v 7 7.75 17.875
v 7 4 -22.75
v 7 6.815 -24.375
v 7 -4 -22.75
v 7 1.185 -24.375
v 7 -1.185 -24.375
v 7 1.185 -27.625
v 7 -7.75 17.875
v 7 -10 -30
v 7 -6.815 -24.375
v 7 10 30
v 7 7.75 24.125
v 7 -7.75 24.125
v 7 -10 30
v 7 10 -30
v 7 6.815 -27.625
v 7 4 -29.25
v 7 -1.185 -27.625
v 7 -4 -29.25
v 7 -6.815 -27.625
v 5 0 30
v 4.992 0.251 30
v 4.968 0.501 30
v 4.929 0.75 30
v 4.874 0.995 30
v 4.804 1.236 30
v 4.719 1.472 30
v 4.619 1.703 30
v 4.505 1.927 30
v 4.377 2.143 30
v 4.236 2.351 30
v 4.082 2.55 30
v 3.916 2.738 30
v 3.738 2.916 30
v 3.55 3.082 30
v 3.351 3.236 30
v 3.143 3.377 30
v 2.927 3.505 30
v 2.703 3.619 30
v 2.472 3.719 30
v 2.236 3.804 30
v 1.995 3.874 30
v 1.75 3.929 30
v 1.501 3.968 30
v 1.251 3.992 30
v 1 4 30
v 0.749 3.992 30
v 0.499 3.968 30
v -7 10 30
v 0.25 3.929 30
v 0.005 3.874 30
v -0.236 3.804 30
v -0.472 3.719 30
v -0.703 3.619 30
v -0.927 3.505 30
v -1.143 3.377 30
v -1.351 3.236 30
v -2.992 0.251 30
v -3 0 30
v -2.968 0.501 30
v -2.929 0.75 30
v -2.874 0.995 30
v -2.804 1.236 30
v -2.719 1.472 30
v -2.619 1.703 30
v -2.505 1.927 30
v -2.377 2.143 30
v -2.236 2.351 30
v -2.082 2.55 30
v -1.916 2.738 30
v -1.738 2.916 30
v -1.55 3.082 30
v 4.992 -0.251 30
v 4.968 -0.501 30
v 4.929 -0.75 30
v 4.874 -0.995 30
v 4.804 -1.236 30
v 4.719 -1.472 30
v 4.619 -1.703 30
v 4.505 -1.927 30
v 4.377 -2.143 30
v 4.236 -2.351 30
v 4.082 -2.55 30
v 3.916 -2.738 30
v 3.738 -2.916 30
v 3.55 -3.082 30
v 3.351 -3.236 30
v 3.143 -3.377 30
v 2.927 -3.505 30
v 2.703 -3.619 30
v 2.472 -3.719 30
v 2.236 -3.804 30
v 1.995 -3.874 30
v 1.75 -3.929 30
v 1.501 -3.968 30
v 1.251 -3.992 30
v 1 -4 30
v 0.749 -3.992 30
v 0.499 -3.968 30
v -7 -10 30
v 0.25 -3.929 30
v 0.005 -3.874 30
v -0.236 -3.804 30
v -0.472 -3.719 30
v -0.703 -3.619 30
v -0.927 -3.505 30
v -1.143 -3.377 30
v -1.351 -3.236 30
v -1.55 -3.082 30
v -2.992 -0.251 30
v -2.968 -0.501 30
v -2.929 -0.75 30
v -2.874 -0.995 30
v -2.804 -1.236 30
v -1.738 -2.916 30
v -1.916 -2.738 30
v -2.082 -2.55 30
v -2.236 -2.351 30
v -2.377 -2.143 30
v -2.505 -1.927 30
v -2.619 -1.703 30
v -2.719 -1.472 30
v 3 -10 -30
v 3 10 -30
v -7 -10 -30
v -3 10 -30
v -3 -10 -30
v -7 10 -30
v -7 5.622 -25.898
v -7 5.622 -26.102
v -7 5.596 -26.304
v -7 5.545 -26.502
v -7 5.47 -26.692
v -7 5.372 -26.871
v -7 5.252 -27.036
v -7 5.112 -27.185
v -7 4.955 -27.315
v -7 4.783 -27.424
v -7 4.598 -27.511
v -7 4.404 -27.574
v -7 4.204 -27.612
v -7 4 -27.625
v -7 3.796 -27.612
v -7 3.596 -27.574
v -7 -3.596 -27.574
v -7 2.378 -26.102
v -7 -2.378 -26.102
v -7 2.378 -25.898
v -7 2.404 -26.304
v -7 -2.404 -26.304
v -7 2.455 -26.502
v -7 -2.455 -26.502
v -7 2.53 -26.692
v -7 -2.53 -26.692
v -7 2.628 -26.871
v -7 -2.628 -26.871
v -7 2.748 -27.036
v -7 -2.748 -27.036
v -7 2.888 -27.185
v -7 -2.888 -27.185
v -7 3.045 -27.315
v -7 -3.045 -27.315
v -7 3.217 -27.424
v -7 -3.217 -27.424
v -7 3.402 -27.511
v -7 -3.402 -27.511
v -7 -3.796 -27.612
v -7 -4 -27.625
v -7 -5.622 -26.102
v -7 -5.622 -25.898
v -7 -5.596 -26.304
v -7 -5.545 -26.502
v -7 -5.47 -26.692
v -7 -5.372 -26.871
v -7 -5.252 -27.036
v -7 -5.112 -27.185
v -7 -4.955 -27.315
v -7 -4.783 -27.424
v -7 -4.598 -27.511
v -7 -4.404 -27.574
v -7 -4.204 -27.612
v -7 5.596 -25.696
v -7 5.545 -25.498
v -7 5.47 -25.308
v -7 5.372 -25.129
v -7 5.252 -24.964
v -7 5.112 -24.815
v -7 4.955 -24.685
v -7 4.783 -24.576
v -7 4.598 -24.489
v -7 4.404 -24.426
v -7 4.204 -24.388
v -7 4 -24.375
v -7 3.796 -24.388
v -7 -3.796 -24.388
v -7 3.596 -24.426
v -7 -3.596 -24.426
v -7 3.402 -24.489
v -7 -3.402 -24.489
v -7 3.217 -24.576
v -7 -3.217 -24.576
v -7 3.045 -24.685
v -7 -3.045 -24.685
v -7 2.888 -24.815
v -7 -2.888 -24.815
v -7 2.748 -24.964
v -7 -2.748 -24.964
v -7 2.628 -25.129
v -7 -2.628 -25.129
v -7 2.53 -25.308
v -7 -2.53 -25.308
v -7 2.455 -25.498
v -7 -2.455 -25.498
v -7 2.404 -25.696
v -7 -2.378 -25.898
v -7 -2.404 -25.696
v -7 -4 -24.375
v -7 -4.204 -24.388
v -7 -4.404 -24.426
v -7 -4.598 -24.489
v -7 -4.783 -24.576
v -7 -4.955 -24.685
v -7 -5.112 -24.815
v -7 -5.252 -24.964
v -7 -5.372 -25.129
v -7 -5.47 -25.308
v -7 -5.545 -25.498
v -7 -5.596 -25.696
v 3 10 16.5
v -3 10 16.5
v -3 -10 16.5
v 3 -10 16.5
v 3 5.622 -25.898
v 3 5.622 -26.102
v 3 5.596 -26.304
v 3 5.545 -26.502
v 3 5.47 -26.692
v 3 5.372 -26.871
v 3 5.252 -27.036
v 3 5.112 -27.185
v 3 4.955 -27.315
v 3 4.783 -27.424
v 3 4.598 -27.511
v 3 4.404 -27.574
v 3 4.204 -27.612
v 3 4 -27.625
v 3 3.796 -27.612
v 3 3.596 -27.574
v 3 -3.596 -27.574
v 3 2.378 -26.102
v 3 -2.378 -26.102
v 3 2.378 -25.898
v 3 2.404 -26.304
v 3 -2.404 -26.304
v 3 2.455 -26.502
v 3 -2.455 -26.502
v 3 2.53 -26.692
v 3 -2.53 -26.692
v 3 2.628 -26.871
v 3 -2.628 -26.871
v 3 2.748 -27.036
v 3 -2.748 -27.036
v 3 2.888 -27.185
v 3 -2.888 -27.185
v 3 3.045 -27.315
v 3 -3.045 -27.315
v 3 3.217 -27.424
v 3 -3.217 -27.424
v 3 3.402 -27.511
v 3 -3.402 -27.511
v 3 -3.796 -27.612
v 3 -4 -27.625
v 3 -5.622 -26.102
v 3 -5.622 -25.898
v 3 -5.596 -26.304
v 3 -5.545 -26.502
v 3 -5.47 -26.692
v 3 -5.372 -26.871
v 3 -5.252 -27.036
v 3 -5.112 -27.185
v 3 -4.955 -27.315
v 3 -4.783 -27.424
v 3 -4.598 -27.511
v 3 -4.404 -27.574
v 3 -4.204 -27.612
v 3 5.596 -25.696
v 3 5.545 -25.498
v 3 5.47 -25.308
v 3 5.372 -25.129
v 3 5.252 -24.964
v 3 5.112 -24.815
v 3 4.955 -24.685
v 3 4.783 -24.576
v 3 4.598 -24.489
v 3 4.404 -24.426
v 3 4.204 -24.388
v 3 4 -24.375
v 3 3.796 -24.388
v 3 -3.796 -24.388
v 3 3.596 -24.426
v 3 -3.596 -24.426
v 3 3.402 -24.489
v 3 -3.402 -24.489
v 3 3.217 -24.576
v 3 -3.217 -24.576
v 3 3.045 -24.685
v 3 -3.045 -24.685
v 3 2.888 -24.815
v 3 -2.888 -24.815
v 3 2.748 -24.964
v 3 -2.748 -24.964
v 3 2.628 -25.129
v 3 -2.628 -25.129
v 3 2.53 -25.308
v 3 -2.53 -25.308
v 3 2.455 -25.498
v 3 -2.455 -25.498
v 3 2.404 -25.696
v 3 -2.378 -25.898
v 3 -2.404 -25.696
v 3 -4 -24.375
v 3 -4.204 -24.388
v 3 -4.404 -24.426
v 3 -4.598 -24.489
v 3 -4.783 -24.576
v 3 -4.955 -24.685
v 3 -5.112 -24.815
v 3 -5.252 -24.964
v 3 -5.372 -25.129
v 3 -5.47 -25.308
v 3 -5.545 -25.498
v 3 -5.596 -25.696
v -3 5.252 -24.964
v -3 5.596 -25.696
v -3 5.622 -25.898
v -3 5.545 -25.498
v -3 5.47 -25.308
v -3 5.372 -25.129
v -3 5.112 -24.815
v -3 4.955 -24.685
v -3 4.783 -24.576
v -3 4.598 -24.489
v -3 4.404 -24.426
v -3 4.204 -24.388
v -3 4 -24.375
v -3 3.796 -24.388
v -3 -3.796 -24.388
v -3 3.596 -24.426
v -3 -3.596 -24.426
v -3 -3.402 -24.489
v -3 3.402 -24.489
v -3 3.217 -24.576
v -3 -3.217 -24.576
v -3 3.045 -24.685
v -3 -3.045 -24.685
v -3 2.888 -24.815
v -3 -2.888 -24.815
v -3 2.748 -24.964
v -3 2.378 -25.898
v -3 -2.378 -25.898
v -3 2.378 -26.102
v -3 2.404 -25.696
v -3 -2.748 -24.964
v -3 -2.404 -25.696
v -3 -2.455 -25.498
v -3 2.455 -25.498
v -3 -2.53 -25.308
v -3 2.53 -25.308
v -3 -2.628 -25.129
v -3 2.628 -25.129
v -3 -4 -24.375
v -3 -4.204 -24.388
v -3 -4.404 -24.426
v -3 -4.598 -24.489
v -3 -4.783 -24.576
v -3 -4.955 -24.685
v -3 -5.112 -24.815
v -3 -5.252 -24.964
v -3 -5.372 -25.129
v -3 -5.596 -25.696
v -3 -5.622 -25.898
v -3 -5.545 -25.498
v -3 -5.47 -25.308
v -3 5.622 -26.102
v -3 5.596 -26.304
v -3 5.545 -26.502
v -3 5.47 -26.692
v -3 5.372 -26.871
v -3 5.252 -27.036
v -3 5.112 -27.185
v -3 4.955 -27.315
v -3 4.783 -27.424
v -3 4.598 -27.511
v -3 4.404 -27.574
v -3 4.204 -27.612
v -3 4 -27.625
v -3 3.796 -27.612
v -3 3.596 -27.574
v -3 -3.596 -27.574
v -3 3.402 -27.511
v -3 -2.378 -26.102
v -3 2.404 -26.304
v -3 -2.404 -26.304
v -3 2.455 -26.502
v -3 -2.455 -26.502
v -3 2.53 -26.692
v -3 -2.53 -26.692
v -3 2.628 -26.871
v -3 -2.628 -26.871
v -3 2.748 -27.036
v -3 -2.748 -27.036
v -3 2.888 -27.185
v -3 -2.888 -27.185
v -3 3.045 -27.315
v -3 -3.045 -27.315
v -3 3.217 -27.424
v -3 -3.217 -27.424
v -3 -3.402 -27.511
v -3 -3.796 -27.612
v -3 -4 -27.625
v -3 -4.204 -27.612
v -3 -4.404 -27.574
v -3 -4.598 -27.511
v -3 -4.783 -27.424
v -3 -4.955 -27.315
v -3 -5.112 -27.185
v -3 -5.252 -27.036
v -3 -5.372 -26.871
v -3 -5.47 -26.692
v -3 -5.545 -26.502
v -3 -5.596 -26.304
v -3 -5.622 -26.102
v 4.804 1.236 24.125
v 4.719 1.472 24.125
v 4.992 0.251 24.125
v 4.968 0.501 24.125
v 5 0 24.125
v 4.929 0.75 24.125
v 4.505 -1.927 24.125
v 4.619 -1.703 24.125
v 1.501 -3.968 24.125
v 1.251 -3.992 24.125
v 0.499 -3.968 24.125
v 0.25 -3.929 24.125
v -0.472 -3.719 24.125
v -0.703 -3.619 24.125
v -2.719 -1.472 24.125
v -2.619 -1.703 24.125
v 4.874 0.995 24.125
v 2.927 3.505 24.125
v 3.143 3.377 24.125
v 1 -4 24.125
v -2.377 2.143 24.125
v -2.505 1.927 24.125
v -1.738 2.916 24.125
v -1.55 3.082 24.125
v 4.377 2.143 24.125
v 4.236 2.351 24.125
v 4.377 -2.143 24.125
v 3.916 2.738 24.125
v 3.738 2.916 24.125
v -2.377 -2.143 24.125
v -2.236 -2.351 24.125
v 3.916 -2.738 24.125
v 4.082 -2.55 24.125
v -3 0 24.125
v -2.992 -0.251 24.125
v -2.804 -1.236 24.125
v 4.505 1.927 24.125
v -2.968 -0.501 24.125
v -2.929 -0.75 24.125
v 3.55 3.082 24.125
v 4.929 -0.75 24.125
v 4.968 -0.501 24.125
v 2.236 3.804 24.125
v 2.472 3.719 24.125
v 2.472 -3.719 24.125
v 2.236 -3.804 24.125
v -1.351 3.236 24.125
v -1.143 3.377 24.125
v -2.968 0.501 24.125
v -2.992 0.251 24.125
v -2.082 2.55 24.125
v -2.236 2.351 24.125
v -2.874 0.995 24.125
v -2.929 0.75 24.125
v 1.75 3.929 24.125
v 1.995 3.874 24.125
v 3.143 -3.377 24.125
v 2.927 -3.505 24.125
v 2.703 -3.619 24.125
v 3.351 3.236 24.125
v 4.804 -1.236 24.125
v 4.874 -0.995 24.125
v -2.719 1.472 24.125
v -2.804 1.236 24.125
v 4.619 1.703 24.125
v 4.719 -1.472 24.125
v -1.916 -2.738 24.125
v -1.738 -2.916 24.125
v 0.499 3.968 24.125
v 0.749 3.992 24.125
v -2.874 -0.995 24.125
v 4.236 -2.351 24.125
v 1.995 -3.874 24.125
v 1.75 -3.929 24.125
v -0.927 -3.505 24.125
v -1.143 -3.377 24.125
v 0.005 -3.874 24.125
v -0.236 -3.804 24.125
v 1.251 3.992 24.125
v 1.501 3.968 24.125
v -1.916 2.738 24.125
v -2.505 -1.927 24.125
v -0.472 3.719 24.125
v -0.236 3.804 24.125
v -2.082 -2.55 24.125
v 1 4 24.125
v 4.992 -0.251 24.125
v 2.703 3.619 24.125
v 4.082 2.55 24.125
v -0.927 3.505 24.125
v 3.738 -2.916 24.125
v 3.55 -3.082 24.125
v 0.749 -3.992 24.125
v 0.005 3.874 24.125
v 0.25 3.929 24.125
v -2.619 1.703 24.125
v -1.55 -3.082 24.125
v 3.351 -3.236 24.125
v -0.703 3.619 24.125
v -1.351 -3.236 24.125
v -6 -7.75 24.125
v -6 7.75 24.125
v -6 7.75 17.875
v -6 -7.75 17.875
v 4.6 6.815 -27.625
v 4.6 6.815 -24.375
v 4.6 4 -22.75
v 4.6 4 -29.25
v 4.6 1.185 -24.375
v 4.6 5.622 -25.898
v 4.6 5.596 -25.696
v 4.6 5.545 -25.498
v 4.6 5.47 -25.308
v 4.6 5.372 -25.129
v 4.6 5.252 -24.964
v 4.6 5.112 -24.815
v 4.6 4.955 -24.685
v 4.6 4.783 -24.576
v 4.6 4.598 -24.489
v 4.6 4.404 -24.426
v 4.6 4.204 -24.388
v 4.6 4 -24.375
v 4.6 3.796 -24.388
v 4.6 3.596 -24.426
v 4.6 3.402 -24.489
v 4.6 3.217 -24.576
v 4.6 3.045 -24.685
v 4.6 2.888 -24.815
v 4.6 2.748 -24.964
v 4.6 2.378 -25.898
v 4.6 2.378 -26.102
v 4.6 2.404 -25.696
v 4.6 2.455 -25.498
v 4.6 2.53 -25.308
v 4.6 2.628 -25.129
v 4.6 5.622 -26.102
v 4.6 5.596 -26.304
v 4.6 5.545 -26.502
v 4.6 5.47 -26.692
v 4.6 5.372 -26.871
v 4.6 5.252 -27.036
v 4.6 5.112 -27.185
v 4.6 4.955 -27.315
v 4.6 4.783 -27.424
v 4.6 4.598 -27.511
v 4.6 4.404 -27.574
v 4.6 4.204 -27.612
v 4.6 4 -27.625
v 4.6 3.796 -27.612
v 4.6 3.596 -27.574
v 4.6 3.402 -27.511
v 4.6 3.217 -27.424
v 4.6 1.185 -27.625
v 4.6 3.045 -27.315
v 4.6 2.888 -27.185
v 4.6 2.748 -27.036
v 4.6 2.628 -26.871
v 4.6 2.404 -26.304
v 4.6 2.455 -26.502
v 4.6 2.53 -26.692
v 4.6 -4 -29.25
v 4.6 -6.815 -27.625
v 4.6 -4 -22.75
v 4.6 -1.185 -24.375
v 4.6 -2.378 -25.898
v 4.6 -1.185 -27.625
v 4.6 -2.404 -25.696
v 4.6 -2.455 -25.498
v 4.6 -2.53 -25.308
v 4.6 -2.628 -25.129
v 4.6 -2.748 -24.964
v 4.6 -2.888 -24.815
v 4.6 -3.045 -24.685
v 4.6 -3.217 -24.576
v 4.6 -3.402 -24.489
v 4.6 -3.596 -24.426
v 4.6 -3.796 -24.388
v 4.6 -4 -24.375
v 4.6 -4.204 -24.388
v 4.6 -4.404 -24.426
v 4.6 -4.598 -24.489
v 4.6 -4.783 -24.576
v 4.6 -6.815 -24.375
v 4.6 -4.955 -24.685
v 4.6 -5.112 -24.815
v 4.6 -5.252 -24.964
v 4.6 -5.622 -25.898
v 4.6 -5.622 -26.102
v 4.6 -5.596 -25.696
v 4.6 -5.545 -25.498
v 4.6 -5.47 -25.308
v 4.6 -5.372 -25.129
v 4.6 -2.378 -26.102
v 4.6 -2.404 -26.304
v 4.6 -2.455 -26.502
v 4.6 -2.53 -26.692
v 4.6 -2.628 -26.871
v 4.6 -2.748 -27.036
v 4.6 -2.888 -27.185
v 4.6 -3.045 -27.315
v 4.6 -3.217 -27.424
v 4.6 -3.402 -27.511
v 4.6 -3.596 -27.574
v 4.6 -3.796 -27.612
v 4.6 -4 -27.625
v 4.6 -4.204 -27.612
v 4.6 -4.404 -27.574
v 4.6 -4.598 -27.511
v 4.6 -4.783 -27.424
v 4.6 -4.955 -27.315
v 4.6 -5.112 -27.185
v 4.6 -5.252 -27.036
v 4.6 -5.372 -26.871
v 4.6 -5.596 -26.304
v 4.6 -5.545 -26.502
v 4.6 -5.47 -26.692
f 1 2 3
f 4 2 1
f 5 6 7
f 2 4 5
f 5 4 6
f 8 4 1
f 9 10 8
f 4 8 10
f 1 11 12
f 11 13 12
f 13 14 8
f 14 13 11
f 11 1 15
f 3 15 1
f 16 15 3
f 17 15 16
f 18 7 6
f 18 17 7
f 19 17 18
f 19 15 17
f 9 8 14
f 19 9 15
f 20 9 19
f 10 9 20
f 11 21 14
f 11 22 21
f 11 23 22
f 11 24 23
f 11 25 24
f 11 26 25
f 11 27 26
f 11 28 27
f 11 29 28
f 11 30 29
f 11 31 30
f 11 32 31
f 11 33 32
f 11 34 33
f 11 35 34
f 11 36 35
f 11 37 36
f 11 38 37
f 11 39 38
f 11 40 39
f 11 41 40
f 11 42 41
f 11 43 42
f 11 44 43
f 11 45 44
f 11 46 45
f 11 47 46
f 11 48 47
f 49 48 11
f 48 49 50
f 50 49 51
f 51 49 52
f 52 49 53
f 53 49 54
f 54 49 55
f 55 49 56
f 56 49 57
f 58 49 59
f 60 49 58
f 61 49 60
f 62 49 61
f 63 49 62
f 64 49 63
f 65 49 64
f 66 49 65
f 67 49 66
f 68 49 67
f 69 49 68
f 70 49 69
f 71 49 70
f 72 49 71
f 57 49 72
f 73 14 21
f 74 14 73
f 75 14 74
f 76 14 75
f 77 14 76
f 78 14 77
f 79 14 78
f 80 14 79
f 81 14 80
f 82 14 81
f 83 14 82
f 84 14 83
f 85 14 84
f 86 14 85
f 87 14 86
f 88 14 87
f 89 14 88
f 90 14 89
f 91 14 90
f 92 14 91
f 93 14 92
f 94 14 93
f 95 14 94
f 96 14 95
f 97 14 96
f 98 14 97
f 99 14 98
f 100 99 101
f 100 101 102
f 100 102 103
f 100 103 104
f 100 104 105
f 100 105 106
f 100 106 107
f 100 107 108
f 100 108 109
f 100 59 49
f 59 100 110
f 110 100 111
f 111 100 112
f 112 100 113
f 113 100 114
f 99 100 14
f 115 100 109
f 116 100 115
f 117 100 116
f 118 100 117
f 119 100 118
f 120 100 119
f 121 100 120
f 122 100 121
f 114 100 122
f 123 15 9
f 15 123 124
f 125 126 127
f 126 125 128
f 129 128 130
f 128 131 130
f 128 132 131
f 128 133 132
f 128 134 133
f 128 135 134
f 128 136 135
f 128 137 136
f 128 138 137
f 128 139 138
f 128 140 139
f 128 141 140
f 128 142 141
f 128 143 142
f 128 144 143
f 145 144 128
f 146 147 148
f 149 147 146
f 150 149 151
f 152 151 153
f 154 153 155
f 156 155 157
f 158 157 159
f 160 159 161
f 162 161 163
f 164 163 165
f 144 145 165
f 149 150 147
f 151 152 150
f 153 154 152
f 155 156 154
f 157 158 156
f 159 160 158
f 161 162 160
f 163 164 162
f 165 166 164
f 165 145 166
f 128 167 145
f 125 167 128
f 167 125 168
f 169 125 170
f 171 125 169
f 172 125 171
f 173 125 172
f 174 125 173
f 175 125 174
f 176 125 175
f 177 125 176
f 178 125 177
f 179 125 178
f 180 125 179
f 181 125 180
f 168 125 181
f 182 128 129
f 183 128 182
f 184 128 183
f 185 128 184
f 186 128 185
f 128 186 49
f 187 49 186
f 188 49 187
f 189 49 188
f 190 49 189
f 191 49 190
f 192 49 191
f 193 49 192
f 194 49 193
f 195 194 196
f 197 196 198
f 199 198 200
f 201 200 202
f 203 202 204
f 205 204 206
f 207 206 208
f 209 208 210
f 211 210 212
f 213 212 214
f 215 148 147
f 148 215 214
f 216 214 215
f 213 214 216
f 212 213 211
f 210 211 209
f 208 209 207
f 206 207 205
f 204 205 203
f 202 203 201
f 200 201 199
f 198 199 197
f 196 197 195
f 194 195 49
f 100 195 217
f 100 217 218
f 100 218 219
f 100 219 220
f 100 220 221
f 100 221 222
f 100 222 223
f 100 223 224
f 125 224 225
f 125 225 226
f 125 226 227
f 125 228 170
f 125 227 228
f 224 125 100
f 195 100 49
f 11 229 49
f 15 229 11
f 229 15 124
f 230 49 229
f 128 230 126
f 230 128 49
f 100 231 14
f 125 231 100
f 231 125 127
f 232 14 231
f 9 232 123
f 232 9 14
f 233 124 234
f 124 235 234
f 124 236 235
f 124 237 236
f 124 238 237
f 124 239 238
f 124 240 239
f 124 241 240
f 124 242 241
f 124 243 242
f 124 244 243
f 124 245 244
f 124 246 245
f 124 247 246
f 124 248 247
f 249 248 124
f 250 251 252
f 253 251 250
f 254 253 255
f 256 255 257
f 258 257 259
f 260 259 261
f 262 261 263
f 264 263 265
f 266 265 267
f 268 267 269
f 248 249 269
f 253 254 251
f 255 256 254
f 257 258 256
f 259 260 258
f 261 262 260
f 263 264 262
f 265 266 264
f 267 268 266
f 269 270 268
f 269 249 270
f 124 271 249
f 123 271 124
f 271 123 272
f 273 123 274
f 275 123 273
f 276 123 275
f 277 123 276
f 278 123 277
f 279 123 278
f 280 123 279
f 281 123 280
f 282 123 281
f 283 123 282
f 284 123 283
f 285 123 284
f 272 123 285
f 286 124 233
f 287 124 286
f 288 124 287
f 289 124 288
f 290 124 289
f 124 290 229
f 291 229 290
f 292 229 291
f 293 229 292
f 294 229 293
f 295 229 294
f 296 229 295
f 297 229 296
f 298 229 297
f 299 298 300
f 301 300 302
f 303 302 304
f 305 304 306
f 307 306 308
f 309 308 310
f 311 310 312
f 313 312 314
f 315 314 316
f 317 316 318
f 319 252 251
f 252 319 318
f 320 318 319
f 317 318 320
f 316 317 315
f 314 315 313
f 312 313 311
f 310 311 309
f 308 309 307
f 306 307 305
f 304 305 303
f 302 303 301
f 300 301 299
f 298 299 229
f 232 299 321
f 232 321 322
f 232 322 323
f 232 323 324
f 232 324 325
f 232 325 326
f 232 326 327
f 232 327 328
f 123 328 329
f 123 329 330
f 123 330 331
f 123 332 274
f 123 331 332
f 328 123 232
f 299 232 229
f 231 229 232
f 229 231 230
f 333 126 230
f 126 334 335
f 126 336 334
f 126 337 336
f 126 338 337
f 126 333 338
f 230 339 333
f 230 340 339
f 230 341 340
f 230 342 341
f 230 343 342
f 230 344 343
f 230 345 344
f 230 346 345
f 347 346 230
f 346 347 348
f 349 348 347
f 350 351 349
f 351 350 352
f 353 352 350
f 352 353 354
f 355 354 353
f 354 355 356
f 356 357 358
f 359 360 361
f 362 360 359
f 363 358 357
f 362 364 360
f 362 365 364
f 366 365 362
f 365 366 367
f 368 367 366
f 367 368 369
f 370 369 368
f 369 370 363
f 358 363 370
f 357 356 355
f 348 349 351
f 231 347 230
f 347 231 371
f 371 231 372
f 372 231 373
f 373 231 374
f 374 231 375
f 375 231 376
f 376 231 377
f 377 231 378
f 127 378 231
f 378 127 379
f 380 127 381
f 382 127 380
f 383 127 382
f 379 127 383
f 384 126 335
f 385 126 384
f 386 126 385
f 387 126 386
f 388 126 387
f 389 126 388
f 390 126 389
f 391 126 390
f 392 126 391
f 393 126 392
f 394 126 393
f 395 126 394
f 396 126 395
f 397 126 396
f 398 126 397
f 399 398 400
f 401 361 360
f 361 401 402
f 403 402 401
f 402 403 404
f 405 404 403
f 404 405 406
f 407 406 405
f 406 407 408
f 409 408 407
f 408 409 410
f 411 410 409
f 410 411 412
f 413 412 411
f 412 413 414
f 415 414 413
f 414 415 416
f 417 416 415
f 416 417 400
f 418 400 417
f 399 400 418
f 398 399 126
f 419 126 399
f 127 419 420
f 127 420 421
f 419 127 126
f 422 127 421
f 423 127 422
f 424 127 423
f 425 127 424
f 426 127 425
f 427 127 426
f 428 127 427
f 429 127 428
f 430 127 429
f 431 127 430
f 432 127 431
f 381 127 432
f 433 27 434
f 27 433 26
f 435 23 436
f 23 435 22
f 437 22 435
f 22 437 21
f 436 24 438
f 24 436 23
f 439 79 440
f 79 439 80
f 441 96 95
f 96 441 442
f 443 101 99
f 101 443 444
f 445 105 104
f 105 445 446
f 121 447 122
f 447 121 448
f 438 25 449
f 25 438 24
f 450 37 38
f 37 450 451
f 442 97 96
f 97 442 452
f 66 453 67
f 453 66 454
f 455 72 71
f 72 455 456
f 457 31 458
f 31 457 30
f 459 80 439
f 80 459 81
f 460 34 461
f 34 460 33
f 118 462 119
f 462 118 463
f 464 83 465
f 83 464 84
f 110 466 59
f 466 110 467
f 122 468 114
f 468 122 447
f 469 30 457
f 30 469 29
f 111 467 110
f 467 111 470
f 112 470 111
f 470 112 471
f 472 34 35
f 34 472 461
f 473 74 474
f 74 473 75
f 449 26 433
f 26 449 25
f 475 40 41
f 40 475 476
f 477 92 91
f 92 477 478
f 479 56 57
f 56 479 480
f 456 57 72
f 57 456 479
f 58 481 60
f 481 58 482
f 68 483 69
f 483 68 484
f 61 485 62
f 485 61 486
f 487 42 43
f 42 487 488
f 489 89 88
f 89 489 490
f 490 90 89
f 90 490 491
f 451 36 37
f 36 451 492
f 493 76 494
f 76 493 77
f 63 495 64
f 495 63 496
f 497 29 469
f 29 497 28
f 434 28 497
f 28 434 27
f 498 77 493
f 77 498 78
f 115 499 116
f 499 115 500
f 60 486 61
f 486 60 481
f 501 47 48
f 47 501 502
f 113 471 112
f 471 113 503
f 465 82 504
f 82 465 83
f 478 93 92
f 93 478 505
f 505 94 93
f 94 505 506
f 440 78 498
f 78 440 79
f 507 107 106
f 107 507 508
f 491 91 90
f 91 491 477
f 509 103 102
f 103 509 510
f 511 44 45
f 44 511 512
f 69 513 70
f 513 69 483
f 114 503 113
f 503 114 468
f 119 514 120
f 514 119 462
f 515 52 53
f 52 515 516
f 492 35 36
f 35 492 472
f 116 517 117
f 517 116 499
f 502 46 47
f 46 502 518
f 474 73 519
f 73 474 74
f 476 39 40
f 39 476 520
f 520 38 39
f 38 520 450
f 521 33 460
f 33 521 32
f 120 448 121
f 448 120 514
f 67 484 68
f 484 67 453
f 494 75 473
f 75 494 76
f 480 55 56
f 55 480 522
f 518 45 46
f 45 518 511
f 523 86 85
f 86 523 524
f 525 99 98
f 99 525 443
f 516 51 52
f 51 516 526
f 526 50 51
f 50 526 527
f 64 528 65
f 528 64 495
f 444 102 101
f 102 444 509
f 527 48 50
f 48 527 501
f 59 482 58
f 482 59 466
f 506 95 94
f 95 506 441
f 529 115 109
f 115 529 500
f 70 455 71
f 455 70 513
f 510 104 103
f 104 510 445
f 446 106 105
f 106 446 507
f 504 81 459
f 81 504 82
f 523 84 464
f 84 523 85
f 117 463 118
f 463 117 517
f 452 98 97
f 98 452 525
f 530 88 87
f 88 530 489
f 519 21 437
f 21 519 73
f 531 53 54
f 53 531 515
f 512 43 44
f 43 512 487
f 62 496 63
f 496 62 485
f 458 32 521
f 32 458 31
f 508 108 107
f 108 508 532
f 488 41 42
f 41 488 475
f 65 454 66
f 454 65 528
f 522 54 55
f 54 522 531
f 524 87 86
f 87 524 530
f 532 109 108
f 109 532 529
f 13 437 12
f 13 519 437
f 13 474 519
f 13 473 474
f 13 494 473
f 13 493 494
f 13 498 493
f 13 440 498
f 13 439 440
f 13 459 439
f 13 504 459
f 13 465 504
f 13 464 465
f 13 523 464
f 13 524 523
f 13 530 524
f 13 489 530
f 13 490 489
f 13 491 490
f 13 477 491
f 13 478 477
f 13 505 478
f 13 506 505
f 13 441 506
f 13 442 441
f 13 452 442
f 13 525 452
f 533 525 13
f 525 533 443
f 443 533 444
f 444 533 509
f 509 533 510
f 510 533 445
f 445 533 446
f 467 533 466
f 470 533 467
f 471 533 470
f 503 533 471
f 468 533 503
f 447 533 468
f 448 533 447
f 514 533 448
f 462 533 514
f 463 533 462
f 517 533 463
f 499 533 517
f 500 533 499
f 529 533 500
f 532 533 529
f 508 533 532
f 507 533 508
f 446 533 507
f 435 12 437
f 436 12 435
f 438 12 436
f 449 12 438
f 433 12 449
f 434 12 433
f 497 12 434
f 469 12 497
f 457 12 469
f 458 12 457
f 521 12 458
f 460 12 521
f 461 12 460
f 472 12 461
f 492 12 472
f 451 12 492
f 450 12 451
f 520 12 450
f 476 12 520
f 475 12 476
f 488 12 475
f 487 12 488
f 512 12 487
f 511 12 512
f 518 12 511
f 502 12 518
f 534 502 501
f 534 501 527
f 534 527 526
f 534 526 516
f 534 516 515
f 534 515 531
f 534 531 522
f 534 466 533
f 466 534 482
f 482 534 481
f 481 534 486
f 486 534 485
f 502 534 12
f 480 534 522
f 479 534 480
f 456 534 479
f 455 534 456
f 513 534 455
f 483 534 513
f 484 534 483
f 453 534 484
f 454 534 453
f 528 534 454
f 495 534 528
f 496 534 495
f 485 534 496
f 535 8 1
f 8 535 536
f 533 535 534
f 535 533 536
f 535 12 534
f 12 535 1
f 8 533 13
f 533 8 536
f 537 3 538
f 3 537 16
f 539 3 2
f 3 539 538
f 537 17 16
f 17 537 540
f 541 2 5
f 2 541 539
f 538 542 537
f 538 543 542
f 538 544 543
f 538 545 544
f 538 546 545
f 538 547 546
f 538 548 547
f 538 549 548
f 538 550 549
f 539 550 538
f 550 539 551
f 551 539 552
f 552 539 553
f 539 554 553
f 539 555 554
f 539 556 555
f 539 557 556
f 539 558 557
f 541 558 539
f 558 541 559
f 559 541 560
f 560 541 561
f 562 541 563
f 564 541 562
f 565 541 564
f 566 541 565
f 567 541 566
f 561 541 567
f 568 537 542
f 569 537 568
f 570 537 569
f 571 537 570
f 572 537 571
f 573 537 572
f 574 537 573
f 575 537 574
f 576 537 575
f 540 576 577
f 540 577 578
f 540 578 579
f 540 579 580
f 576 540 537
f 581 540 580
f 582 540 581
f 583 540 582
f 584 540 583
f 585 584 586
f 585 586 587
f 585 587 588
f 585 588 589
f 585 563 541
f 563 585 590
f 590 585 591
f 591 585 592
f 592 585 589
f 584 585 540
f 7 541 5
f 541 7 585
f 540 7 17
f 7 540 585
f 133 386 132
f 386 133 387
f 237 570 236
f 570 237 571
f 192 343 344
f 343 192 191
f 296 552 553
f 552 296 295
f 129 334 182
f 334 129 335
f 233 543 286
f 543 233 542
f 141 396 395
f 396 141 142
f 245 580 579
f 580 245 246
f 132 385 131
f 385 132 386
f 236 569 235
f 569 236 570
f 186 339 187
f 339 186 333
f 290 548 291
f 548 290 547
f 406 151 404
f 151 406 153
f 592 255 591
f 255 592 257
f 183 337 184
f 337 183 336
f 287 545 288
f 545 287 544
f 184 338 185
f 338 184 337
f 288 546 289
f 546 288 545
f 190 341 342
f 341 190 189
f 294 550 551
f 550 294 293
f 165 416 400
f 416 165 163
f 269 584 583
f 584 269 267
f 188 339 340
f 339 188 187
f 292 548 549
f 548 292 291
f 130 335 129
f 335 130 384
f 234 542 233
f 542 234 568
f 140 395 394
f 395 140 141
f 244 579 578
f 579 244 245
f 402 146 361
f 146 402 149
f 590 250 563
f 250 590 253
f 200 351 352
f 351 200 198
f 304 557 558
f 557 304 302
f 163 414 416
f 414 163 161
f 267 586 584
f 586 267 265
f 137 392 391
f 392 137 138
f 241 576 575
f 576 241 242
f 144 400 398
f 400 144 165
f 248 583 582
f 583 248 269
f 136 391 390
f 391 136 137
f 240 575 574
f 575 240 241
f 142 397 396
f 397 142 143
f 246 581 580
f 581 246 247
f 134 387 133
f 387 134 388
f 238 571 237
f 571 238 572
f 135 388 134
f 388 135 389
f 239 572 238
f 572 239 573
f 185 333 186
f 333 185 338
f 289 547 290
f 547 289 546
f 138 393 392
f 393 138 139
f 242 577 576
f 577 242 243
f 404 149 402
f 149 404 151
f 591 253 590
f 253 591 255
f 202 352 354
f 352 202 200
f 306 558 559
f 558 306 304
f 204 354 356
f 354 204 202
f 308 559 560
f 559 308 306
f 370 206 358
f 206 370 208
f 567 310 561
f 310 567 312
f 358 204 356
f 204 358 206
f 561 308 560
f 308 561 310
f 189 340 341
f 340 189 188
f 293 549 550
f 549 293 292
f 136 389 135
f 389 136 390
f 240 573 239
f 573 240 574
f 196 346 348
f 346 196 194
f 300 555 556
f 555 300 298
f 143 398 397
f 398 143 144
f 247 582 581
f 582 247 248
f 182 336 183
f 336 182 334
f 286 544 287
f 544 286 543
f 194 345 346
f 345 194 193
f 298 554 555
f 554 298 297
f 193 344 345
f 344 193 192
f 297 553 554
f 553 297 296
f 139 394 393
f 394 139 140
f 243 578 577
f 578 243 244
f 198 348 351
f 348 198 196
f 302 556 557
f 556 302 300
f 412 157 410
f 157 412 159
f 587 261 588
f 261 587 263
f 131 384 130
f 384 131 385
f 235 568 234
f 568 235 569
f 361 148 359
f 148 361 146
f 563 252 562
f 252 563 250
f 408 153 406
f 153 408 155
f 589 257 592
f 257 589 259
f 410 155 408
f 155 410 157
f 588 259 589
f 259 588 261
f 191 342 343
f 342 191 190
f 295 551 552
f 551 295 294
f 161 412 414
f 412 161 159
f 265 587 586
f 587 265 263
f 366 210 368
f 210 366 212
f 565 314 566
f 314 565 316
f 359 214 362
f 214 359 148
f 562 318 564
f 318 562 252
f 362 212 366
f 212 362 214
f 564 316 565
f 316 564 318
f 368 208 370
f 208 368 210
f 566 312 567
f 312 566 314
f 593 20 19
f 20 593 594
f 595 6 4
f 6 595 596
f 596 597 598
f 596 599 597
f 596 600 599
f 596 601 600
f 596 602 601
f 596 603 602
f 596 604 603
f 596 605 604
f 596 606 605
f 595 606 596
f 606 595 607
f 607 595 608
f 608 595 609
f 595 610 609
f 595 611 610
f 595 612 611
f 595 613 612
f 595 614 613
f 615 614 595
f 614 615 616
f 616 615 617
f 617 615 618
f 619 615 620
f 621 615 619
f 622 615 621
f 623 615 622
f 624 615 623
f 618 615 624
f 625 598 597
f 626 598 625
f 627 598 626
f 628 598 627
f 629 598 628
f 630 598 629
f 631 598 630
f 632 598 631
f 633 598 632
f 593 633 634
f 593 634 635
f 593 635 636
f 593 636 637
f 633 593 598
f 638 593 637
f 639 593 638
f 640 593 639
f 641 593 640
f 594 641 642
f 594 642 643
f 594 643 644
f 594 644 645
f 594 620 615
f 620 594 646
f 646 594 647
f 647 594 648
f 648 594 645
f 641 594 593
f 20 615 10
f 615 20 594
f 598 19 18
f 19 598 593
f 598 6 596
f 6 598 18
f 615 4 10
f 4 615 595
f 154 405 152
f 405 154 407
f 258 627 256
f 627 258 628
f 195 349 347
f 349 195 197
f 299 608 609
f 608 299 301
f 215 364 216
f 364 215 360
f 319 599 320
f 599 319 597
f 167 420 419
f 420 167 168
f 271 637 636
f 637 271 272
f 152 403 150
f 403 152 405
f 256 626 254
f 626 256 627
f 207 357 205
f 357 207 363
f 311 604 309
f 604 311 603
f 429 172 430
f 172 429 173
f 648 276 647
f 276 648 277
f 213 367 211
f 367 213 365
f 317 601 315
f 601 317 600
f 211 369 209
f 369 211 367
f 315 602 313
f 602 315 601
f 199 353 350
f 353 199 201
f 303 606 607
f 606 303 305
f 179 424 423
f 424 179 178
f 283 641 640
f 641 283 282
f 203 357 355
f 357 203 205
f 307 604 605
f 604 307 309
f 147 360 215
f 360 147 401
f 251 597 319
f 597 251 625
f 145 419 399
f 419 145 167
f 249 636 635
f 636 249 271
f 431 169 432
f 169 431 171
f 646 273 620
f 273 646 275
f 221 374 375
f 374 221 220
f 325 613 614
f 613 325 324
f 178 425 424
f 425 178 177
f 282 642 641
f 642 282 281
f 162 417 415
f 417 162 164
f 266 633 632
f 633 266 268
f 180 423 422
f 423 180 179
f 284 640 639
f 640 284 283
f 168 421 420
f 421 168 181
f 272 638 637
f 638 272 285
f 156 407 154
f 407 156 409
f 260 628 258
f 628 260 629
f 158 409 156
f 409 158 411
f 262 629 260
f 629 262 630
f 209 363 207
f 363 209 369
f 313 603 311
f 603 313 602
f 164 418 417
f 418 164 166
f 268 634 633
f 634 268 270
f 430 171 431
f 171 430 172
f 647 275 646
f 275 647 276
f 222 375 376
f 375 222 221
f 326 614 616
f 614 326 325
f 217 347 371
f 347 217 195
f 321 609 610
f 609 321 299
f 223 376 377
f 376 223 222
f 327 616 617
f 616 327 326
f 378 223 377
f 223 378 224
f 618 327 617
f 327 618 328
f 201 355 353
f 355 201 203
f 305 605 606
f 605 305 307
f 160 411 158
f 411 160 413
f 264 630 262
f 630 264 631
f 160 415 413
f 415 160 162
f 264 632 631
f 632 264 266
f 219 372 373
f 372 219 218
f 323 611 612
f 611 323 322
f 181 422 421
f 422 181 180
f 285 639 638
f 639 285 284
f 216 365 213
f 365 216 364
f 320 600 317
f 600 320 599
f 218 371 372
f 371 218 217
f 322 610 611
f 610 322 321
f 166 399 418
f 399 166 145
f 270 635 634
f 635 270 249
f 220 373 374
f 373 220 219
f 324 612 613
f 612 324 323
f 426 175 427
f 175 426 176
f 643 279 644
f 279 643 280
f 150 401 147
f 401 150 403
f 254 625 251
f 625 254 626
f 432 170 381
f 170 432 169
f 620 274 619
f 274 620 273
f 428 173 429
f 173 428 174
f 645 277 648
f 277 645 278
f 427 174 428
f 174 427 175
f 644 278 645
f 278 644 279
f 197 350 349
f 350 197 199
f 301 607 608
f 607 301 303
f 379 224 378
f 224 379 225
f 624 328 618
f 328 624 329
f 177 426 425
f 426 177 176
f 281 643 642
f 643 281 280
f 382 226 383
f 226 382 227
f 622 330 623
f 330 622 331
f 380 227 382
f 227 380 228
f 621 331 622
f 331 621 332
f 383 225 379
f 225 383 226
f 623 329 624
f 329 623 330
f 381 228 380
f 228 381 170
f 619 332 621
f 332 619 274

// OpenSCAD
//---------------------------------------------------------------------
//  Spool holder for Prusa i3 with 6mm aluminium Frame   
//  (c)iPadNanito <@iPadNanito> , March-2013                        
//---------------------------------------------------------------------

nut_diam = 6.5;  // M3 Nut diameter
screw_diam = nut_diam/2; // Nut hole for screw diameter

module frame_support()
{
	difference()
	{
		difference()
		{
	
			difference()
			{
	
				difference() 
				{
					cube([14,20,60], center = true); // Piece body
					translate([0,0,-8.5])
					cube([6,22,50], center = true);  // Hole where inserts the aluminium frame
				}

				translate([1,0,30])
				cylinder(r=8/2, h=20, $fn=100, center = true); // M8 hole for threaded rod
			}
	
			translate([1,0,21])
			cube([14,15.5,6.25], center = true); // Hole where inserts M8 nut 
		}
		
		translate([6.1,4,-26])
		nut(); // M3 nut 1

		rotate([0,90,0]) translate([26,4,0])
		cylinder(r=screw_diam/2, h=50, $fn=50, center = true); // Nut hole for screw 1

		translate([6.1,-4,-26])
		nut(); // M3 nut 2

		rotate([0,90,0]) translate([26,-4,0])
		cylinder(r=screw_diam/2, h=50, $fn=50, center = true); // Nut hole for screw 2
	}
}

module nut()
{	
	rotate([0,90,0])
	cylinder(r=nut_diam/2, h=3, $fn=6, center = true); //M3 nut body without screw hole
}

frame_support();
